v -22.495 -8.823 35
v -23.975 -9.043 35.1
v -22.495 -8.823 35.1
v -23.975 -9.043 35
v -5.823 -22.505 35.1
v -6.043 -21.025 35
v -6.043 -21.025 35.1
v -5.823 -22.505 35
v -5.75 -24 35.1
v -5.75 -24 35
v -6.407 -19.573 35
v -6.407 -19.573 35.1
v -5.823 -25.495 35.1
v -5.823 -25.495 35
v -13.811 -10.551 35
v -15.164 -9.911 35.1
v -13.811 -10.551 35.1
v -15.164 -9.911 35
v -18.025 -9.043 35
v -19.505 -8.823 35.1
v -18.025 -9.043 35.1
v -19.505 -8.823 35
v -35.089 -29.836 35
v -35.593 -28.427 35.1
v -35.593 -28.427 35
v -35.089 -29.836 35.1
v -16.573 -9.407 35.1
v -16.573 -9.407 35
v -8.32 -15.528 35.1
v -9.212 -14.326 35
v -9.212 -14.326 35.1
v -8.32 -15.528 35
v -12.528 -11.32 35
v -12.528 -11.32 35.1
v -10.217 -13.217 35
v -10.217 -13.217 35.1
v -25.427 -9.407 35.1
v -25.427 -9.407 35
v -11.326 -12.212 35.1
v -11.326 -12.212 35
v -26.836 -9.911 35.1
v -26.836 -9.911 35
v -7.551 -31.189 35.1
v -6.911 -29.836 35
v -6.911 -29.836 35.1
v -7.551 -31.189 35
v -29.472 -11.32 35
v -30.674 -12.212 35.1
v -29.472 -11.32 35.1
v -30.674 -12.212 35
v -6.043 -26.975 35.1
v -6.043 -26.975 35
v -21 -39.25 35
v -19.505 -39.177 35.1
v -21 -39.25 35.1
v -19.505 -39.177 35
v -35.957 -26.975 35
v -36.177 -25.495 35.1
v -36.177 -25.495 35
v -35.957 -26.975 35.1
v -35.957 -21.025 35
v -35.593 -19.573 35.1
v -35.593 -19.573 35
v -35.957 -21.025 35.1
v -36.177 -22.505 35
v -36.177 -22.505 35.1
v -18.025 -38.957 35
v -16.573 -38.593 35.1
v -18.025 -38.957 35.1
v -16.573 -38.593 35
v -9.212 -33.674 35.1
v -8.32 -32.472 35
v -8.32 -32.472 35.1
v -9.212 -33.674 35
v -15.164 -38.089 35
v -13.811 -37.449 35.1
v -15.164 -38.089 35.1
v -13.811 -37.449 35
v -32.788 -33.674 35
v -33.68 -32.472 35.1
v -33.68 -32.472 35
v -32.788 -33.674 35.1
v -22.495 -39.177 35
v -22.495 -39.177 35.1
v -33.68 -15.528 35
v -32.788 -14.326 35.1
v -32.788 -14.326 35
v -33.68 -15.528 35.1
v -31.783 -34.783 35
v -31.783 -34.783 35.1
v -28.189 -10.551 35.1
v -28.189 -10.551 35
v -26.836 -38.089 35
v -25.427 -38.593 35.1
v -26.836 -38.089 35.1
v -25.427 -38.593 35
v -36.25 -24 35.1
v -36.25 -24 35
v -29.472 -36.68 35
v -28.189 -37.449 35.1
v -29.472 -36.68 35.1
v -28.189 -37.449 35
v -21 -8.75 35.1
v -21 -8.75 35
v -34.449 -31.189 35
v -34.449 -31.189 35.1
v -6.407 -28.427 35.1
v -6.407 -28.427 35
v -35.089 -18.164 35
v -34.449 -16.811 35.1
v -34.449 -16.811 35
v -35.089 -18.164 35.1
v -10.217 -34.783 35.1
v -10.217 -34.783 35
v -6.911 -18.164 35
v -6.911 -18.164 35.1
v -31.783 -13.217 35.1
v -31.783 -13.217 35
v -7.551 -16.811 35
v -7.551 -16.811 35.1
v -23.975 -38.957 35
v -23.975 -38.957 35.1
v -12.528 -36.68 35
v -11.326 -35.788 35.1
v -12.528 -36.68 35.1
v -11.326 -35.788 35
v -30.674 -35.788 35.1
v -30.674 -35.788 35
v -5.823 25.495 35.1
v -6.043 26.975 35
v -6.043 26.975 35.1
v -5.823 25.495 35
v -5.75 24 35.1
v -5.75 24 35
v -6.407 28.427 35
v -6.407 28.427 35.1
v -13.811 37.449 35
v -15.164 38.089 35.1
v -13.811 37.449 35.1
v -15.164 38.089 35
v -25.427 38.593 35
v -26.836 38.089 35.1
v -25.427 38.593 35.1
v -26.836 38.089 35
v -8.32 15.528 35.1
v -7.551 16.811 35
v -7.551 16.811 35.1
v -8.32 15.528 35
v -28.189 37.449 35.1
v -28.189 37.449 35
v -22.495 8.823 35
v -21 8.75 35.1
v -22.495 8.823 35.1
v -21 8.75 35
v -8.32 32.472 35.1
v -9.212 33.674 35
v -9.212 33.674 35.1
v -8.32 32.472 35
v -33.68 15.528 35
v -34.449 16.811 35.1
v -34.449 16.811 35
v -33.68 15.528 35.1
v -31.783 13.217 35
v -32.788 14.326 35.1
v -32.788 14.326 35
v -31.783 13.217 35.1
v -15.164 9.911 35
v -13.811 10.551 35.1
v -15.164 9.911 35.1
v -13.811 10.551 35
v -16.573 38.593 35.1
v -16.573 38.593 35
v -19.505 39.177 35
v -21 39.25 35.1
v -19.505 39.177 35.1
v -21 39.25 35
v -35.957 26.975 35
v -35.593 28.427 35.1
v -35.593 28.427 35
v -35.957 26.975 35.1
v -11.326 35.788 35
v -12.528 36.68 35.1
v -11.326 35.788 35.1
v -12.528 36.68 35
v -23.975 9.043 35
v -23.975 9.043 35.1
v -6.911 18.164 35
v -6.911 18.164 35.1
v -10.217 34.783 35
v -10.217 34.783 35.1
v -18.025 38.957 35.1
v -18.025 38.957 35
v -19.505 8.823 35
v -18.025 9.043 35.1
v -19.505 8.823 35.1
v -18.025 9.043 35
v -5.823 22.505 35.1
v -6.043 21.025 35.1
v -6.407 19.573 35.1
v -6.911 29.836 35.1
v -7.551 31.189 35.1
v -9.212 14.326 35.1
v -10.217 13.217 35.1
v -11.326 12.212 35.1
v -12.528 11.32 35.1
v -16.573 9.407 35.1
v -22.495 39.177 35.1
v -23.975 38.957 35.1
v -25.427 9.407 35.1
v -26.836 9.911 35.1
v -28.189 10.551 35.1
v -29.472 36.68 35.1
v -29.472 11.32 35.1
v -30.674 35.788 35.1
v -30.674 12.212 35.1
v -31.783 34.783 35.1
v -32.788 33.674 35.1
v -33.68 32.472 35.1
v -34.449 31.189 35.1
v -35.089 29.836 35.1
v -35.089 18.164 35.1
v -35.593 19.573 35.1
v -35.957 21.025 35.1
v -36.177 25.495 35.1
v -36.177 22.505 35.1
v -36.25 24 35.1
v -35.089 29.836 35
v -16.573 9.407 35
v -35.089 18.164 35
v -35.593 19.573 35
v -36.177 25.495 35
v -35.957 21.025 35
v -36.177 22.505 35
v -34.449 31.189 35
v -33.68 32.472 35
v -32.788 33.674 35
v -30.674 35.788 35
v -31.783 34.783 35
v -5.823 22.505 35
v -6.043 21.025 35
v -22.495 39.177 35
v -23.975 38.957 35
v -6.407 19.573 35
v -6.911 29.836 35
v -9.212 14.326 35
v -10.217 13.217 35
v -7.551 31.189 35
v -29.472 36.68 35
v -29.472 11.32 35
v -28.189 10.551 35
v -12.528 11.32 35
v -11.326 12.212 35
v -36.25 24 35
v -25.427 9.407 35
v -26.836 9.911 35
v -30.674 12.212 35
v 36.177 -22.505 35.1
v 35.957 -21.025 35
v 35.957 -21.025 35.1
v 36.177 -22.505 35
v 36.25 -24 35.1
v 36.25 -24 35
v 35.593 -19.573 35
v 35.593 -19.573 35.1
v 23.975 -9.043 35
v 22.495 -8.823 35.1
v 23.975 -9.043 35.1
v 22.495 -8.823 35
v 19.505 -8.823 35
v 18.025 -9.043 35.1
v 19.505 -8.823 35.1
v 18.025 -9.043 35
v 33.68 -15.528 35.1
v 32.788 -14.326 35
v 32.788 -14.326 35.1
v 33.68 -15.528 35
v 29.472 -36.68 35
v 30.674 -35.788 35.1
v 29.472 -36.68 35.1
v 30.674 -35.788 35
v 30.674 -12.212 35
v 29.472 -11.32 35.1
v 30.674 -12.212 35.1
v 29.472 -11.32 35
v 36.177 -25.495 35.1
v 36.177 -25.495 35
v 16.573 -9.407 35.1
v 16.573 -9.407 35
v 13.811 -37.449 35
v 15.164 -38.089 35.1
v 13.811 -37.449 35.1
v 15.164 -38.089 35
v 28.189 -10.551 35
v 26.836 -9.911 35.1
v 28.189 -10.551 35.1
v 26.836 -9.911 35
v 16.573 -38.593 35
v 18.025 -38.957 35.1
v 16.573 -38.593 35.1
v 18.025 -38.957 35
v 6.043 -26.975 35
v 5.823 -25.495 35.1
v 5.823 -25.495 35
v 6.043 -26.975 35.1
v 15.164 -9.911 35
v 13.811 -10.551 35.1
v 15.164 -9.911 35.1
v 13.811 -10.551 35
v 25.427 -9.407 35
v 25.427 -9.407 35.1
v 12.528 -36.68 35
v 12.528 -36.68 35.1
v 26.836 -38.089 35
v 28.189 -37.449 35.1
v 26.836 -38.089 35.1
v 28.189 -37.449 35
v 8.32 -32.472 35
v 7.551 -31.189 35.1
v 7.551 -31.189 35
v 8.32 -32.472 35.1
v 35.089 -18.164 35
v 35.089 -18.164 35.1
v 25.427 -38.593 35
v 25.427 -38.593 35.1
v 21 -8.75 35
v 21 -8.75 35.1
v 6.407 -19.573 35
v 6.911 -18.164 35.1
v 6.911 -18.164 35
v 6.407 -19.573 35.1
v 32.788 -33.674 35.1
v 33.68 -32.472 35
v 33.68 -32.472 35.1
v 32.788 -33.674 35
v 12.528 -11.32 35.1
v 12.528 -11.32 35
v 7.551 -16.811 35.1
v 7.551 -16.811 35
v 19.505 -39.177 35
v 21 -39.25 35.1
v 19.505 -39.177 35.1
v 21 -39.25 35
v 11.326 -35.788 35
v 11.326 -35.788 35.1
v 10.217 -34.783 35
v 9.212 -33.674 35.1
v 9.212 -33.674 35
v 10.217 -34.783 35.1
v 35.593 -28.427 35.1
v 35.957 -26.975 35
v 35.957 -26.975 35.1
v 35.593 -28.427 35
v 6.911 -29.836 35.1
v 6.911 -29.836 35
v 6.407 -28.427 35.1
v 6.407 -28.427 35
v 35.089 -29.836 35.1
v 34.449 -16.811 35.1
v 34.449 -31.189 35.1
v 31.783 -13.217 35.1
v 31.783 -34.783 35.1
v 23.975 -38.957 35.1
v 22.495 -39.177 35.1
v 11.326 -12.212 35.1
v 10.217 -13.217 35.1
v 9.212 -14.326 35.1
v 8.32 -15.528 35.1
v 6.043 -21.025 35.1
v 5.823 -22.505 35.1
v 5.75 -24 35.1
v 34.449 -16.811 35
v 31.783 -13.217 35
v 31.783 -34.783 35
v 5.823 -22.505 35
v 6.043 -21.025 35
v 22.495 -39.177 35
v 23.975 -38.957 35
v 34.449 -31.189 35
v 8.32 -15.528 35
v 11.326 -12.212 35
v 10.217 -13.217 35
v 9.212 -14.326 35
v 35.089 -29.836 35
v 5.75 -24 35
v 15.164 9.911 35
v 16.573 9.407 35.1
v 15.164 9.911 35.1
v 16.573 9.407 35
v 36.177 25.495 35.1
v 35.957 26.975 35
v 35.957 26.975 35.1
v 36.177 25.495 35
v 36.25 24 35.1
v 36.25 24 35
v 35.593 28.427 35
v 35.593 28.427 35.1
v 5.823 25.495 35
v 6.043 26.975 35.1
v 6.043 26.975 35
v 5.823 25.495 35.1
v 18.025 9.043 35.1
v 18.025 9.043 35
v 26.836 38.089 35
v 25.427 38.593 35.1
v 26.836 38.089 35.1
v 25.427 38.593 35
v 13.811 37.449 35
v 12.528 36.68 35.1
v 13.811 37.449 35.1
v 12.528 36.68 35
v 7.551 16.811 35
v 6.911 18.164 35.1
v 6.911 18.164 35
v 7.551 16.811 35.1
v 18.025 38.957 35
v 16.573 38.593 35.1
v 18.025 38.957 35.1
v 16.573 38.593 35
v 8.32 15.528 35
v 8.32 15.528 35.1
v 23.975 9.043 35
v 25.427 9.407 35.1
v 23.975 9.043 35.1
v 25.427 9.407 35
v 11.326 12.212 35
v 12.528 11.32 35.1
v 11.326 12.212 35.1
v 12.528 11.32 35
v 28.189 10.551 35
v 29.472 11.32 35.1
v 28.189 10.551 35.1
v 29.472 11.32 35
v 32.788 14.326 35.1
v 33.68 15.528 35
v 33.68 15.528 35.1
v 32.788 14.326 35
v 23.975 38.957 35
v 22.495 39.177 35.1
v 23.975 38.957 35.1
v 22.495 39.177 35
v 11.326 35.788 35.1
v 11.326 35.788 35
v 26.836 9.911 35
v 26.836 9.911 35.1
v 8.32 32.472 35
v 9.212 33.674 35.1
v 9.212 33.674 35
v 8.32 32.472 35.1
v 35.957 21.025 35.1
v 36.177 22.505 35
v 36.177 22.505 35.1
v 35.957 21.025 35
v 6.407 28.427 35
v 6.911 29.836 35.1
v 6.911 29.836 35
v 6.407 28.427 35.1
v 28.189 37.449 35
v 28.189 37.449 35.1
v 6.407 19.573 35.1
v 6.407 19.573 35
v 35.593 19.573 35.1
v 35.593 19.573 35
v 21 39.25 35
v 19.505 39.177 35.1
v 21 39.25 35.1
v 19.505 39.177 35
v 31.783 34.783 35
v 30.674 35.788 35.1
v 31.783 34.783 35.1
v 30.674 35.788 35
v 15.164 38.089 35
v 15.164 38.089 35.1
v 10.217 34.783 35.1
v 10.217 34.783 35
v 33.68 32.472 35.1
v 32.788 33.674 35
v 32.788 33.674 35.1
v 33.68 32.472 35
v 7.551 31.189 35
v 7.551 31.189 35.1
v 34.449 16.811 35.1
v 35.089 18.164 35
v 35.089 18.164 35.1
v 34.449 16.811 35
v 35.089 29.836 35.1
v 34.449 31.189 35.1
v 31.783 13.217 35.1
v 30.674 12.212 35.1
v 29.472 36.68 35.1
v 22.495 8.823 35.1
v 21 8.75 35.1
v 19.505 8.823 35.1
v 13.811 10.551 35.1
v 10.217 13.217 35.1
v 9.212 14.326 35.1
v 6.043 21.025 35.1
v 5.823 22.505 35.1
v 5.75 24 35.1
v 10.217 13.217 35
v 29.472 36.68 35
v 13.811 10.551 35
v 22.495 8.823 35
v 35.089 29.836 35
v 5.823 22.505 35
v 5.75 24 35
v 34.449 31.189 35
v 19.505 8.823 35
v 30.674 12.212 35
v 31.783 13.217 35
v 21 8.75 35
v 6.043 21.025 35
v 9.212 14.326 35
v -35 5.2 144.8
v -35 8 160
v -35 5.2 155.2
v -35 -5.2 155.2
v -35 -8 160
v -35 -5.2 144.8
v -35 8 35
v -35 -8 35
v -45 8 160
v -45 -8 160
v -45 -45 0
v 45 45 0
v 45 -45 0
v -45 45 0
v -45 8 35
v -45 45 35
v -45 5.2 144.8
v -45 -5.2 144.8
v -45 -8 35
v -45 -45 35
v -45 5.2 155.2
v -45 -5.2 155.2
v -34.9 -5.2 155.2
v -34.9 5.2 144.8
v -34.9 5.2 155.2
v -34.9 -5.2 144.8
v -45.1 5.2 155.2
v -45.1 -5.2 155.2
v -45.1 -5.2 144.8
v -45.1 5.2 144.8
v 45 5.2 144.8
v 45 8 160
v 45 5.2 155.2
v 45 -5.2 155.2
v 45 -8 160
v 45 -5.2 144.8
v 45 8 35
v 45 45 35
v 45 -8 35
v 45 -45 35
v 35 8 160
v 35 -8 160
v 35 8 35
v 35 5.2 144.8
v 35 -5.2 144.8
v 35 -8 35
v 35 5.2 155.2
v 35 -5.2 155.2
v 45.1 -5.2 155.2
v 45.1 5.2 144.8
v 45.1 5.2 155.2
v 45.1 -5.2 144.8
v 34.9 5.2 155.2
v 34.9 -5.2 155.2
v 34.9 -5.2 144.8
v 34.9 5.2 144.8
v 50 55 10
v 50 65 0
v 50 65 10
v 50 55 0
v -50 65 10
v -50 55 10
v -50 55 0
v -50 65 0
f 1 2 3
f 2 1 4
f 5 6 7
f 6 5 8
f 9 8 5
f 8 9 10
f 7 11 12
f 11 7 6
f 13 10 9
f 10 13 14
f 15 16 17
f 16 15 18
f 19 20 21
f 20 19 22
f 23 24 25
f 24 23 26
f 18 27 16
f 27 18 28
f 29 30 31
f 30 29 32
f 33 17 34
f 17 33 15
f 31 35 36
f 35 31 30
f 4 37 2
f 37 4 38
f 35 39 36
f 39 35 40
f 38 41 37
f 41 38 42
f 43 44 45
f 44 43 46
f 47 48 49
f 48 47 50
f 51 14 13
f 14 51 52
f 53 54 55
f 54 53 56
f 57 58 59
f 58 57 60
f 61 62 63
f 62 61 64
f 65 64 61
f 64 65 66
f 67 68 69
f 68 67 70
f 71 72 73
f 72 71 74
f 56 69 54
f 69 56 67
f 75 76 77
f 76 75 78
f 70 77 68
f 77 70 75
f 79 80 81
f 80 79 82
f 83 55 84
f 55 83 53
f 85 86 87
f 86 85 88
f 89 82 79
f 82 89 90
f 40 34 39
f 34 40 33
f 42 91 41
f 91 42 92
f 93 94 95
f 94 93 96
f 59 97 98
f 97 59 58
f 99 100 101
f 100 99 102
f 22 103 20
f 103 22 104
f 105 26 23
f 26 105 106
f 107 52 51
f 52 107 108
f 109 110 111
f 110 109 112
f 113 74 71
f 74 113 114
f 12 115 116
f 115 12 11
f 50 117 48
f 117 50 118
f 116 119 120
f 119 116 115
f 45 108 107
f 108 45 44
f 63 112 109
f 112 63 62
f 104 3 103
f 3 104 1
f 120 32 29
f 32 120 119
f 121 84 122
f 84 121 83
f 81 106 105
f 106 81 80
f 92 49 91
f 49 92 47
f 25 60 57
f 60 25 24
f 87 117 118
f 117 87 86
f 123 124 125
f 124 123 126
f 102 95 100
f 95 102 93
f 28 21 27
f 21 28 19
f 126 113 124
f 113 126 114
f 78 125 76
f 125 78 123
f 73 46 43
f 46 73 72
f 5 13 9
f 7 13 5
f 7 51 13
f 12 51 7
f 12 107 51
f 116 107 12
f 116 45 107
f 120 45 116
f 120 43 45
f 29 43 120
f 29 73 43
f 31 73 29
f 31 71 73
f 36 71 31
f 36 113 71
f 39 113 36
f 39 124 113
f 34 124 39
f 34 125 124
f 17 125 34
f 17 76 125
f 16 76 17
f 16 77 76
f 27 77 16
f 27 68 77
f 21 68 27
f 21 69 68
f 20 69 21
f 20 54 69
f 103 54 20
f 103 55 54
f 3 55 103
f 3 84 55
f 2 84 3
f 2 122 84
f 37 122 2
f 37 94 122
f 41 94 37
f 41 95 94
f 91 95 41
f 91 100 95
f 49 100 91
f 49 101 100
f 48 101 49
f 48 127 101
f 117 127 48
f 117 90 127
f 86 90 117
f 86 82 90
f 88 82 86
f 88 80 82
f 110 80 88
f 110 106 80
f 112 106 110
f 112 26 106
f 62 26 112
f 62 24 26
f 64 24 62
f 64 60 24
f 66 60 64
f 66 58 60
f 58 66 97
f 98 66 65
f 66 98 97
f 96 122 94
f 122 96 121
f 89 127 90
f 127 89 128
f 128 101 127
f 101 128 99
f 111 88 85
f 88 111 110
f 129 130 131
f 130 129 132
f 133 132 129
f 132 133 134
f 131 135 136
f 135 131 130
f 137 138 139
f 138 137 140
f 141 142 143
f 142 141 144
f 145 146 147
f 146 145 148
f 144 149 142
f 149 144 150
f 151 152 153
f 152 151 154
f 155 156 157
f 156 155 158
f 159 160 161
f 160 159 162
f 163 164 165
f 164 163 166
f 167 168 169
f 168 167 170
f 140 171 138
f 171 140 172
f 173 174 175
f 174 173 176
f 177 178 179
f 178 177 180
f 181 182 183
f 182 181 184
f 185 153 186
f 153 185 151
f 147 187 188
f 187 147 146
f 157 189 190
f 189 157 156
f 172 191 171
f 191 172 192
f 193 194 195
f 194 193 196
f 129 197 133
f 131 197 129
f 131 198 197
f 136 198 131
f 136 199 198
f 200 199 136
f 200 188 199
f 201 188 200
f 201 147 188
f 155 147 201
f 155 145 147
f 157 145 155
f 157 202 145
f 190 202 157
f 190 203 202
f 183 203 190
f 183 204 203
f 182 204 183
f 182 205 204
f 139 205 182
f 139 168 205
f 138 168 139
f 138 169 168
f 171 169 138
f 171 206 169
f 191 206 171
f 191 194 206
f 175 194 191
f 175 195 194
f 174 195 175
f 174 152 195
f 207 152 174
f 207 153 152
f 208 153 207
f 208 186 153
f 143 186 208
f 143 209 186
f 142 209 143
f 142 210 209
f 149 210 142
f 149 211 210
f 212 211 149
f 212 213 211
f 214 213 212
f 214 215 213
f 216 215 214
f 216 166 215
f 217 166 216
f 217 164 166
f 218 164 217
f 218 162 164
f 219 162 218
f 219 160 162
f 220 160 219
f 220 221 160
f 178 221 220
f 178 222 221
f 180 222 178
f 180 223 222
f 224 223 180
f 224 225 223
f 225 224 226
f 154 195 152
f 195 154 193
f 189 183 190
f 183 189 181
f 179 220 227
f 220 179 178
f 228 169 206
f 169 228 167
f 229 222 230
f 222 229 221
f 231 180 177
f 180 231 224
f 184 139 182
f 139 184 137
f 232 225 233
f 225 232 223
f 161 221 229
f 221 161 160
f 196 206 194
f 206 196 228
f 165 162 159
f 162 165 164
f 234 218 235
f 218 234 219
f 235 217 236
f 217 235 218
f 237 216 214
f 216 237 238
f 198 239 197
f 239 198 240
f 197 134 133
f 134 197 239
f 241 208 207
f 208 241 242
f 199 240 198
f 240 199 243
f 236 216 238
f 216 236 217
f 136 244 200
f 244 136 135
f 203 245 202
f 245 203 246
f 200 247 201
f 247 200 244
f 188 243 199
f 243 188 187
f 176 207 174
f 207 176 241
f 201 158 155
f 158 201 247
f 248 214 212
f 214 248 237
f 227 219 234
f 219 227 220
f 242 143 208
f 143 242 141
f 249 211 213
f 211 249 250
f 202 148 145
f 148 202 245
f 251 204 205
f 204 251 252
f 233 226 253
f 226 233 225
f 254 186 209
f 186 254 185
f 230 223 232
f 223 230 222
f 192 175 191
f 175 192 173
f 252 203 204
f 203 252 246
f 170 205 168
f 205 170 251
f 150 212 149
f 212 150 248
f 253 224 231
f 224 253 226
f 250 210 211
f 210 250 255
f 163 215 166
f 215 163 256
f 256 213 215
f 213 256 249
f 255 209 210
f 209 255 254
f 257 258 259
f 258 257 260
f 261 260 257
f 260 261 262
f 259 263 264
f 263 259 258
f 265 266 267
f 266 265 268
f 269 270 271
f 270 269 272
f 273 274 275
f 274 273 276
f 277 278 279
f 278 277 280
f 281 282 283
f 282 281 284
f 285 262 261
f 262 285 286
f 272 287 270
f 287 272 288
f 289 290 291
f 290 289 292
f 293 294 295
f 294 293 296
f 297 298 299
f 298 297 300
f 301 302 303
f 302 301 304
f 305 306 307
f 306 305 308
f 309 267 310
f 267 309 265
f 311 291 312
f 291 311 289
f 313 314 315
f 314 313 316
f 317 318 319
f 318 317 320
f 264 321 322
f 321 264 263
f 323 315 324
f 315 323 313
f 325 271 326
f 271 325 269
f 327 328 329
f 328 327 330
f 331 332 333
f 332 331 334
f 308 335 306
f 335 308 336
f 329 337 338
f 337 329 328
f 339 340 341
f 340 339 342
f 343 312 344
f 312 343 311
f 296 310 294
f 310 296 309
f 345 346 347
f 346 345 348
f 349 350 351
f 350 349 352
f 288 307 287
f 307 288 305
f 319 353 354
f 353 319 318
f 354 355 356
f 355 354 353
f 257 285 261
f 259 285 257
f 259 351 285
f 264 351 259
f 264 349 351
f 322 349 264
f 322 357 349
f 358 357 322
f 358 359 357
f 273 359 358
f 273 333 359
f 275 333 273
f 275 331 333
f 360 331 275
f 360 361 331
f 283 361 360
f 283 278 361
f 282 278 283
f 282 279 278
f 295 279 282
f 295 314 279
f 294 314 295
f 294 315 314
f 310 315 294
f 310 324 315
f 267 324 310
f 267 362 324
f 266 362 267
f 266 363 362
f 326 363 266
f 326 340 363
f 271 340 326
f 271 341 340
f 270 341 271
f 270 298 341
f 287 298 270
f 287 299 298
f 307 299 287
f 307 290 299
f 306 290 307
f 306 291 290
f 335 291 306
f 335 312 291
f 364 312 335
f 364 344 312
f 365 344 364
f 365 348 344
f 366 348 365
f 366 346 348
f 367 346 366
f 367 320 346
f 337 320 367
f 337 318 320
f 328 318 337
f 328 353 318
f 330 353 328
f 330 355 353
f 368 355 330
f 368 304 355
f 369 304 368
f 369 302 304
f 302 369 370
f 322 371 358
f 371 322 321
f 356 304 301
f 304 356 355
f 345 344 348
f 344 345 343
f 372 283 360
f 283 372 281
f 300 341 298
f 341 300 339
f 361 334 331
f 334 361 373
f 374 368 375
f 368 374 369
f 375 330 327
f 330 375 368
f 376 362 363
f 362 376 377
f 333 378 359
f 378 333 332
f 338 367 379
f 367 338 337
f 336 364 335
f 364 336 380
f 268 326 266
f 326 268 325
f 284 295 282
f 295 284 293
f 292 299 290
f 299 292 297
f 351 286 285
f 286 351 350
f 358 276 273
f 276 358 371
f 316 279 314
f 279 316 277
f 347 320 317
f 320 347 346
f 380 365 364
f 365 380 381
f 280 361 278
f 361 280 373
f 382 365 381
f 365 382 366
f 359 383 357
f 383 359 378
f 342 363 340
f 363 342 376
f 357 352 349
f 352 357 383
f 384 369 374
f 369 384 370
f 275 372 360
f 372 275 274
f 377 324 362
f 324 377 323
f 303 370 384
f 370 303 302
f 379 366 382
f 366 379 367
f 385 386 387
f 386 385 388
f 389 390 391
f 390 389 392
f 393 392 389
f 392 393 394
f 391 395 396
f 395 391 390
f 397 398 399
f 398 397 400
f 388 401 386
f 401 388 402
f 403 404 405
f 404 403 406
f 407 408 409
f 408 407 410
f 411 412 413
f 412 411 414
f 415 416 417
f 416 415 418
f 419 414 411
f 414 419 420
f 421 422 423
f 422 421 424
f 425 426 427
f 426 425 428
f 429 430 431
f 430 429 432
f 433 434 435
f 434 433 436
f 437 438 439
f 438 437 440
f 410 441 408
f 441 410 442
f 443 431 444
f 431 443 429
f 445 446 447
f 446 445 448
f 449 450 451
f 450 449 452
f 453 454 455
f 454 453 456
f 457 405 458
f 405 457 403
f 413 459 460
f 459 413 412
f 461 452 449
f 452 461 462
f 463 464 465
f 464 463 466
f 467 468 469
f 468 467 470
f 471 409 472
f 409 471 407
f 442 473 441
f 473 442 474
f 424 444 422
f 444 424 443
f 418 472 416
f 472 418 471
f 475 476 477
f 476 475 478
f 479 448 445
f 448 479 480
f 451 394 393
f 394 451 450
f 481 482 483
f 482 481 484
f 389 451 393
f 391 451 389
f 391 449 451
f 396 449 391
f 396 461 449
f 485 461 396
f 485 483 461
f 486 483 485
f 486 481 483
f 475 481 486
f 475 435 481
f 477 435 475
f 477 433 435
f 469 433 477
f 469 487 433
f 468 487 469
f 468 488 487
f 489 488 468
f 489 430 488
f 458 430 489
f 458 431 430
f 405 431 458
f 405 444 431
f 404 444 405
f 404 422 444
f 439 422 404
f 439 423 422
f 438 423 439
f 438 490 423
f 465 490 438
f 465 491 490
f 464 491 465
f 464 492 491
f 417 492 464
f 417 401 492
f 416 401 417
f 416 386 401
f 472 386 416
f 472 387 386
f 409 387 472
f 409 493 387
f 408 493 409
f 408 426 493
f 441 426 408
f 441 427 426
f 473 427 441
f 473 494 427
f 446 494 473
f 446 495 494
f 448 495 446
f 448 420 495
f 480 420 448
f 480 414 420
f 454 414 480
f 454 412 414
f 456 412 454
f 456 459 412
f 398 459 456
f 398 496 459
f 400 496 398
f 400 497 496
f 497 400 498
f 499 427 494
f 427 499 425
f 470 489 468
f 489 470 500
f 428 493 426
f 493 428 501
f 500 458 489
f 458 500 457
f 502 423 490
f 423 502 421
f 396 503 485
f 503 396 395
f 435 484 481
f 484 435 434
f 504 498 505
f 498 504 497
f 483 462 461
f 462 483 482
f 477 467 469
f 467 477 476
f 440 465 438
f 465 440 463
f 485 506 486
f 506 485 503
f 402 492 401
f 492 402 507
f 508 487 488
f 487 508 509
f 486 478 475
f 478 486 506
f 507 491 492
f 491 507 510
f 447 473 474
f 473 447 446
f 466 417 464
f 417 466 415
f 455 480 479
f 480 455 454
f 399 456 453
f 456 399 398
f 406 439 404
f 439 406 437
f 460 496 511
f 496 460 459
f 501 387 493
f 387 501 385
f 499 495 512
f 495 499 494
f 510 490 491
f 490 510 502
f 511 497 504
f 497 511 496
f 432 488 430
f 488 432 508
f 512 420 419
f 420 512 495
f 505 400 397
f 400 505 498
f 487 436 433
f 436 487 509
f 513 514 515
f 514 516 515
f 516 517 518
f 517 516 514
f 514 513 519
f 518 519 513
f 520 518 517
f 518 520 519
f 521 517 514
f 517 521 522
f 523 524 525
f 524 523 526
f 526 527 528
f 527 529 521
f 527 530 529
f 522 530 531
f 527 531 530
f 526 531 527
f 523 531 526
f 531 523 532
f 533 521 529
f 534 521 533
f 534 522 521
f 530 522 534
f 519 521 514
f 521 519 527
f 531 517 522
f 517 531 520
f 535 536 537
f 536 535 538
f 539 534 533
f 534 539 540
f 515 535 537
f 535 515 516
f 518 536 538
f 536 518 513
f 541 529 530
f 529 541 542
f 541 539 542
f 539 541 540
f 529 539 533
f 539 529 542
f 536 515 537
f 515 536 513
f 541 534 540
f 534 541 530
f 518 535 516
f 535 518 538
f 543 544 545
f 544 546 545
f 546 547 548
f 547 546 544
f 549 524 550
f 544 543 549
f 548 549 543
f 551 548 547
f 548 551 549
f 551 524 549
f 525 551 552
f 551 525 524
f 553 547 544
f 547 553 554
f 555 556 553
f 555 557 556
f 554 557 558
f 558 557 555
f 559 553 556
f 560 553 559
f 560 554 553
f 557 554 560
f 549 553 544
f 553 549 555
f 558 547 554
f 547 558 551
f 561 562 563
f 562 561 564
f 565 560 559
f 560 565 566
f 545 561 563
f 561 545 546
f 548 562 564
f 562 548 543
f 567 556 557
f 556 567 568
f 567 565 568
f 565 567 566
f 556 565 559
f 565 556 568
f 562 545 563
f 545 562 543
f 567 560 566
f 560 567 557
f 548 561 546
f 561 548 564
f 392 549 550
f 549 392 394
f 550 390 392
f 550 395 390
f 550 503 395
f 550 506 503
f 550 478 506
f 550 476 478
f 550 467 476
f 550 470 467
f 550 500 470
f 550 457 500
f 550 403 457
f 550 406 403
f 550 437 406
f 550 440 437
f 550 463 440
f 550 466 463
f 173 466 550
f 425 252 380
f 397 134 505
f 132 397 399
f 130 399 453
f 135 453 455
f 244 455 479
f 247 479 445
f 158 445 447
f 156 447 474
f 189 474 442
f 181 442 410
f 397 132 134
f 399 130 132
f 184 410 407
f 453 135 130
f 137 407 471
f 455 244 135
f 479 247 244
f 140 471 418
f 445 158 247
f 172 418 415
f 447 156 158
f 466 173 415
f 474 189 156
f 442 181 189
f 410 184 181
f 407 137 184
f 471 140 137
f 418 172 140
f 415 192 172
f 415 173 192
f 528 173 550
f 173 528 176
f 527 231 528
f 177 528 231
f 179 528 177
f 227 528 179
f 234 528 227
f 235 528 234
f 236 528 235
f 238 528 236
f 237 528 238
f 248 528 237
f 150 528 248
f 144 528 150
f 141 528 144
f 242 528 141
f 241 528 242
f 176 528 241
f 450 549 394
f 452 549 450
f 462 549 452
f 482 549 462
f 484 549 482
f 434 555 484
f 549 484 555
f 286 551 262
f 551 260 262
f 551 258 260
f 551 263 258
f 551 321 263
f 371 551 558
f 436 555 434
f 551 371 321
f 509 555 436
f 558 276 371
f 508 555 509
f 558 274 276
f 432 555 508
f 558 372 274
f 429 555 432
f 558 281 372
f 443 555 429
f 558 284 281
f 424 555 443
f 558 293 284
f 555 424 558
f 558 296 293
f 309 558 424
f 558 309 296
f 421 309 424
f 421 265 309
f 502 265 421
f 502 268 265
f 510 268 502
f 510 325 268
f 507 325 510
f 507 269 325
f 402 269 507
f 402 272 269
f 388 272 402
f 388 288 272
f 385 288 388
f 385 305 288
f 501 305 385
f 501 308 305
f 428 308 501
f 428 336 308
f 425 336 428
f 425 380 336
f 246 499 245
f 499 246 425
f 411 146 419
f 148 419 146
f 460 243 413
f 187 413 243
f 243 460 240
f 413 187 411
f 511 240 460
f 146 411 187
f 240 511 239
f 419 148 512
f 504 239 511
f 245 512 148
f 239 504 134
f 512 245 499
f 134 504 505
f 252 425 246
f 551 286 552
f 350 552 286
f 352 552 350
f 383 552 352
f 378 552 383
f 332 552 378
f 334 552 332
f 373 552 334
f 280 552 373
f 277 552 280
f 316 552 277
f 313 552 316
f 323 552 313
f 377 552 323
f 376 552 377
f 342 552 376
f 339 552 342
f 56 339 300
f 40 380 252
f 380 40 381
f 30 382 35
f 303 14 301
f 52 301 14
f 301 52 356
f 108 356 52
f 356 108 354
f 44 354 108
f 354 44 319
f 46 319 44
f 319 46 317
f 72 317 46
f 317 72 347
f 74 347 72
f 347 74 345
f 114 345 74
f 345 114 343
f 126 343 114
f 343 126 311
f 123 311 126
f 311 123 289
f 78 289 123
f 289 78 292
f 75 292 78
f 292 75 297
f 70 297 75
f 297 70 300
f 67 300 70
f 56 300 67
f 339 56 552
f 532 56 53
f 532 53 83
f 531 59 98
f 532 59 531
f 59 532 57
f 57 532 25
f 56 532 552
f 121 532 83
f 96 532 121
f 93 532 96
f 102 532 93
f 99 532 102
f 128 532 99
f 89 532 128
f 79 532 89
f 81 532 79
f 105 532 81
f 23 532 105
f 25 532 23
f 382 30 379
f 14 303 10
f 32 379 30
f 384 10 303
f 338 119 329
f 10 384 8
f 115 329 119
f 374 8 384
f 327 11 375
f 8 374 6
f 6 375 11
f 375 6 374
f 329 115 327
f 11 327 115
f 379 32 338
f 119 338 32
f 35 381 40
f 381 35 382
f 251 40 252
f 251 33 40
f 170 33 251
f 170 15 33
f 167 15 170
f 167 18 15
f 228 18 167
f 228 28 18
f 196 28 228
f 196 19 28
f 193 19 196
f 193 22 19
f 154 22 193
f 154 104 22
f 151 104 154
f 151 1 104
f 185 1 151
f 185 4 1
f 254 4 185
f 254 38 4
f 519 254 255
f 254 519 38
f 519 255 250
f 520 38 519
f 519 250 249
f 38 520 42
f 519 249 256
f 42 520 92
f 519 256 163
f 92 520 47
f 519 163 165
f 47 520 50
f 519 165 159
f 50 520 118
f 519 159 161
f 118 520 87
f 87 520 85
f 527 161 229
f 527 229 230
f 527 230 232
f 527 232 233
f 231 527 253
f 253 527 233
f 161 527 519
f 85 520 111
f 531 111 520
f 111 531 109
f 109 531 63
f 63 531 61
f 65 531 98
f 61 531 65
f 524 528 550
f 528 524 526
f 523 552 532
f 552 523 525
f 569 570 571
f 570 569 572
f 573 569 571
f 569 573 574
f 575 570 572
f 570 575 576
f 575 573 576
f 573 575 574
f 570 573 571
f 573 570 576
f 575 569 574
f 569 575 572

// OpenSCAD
// Carrier for four 50 mL conical tubes, printed as two parts side by side.
// Units: millimetres. Print orientation: parts rest on the XY plane (z = 0),
// building upward (+Z). Part 1 is centred on the origin; Part 2 (handle) is
// offset in +Y so the two parts print side by side.

$fn = 64;

// ---------------- Part 1: base block + two posts ----------------
base_w   = 90;   // base block width  (X)
base_d   = 90;   // base block depth   (Y)
base_h   = 35;   // base block height  (Z)

seat_d   = 30.5; // blind seat diameter
seat_dep = 30;   // blind seat depth (leaves a 5 mm floor)
seat_x   = 21;   // seat centre |x|
seat_y   = 24;   // seat centre |y|

post_t   = 10;   // post thickness (X)
post_w   = 16;   // post width     (Y)
post_h   = 160;  // post height (top at z = 160)
post_x   = 40;   // post centre |x| (10 mm thick, flush with 90 mm end faces)
post_hole = 10.4;// square through-hole side (X)
post_hole_z = 150; // hole centre height

// ---------------- Part 2: handle bar ----------------
bar_t    = 10;   // bar thickness (X)
bar_w    = 10;   // bar width     (Y)
bar_len  = 100;  // bar length    (X)
bar_y    = 60;   // bar centre Y (spans y = 55..65, 10 mm gap to base +Y face)

// ================= PART 1 =================
part1() ;

module part1() {
    union() {
        // Base block, centred on the origin
        translate([-base_w/2, -base_d/2, 0])
            cube([base_w, base_d, base_h]);

        // Four blind tube seats (30.5 mm dia, 30 mm deep, 5 mm floor)
        for (sx = [-seat_x, seat_x])
            for (sy = [-seat_y, seat_y])
                translate([sx, sy, base_h - seat_dep])
                    cylinder(h = seat_dep + 0.1, d = seat_d);

        // Two posts, flush with the X end faces, centred on y = 0
        for (px = [-post_x, post_x]) {
            translate([px - post_t/2, -post_w/2, 0])
                cube([post_t, post_w, post_h]);

            // 10.4 x 10.4 mm square through-hole along X, centred at z = 150
            translate([px - post_t/2 - 0.1, -post_hole/2, post_hole_z - post_hole/2])
                cube([post_t + 0.2, post_hole, post_hole]);
        }
    }
}

// ================= PART 2 (handle) =================
// Printed side by side with part 1 (offset in +Y). After printing, the bar is
// pushed through both posts (it spans y = 55..65, i.e. 10 mm clear of the base).
translate([0, bar_y, 0])
    part2();

module part2() {
    // Square bar 10 x 10 mm, 100 mm long, lying on the bed along X, centred on x = 0
    translate([-bar_len/2, -bar_w/2, 0])
        cube([bar_len, bar_w, bar_t]);
}
